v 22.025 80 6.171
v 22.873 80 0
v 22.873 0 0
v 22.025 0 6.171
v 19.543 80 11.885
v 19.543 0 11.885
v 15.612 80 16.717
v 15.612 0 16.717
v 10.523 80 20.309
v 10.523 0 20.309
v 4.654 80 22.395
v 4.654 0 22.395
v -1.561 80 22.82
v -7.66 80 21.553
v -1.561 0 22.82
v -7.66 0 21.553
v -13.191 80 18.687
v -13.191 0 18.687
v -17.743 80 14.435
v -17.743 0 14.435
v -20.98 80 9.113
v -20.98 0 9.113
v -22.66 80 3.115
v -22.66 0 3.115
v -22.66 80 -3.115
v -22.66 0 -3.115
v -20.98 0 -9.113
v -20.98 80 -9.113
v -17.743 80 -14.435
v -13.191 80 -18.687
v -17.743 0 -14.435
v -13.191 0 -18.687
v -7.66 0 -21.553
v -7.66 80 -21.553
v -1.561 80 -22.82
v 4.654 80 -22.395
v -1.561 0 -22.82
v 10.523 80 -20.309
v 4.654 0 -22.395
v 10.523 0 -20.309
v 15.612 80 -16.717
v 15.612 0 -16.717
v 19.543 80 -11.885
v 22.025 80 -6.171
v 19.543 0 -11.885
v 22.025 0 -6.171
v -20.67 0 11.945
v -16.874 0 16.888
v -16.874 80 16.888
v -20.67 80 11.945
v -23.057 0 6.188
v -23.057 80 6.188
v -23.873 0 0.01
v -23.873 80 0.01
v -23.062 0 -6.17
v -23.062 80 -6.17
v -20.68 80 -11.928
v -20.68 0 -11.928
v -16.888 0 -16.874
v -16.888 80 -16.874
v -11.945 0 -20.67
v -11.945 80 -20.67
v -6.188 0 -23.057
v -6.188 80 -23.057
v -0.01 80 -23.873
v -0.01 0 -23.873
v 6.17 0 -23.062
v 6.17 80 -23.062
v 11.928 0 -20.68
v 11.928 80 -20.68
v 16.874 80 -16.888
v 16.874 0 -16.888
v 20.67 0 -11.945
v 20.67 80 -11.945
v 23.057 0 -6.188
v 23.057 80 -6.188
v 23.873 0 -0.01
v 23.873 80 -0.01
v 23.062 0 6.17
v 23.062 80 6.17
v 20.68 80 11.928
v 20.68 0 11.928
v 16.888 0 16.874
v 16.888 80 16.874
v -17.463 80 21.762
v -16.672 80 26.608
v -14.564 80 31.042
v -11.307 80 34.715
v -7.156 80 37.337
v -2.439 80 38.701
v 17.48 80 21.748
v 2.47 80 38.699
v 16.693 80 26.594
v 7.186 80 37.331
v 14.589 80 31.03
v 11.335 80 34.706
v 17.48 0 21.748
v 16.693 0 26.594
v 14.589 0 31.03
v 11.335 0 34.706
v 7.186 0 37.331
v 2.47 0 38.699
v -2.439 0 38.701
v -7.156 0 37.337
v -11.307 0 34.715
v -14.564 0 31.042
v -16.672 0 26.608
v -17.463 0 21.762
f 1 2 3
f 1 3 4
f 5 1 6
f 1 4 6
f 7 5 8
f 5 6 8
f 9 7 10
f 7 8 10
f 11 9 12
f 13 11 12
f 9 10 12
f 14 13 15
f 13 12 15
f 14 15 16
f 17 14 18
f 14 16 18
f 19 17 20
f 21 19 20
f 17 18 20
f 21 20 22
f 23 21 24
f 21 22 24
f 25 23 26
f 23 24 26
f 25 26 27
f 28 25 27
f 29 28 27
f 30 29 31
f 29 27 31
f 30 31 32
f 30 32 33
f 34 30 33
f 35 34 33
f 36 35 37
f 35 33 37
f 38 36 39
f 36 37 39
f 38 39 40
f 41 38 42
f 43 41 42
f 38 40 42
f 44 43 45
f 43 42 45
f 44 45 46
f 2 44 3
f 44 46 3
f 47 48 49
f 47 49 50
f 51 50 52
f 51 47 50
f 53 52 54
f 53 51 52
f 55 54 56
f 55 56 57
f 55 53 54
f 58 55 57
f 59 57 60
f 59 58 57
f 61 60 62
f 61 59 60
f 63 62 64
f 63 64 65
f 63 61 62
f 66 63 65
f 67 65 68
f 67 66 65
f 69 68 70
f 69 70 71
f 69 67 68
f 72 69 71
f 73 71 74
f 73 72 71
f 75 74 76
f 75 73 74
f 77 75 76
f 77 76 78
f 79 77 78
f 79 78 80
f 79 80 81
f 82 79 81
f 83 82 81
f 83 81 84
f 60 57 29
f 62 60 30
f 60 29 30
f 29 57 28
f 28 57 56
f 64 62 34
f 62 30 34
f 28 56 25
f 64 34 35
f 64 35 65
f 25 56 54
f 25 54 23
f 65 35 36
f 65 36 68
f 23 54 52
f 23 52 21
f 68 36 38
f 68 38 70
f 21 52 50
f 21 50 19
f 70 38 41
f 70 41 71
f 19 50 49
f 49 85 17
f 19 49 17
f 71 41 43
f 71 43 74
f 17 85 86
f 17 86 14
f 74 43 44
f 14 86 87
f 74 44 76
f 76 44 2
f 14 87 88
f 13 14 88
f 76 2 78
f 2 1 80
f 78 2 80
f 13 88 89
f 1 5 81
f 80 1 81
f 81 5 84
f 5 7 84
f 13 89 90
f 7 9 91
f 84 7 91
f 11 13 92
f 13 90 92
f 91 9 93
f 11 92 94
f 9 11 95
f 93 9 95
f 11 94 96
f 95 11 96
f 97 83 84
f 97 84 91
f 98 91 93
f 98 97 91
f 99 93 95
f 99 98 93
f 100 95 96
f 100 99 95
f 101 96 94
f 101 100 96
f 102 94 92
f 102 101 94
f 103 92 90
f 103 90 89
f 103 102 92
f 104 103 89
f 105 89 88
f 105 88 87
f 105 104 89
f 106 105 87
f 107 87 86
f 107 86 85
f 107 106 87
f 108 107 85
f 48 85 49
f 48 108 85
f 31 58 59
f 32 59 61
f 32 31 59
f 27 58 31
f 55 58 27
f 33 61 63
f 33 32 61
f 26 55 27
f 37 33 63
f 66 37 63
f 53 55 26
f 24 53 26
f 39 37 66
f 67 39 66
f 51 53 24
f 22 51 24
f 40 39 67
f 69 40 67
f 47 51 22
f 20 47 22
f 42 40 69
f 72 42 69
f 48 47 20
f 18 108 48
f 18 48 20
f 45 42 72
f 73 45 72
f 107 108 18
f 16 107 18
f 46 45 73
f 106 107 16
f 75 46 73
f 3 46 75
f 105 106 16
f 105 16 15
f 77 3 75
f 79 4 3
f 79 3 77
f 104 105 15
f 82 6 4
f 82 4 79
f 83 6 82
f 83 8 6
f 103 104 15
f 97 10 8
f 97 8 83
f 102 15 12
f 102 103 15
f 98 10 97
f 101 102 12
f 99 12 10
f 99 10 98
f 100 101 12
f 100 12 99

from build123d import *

# Parameters (mm, degrees)
F0_R     = 23.8732414638
F1_DEPTH = 80
F2_R     = 22.8732414638
F3_DEPTH = 80
F5_DEPTH = 80


with BuildPart() as f1:
    # F0 (on Front) → F1 (new body)
    with BuildSketch(Plane.XZ):
        Circle(F0_R)
    extrude(amount=-F1_DEPTH)

    # F2 (on face) → F3 (cut)
    with BuildSketch(Plane.XZ):
        Circle(F2_R)
    extrude(amount=-F3_DEPTH, mode=Mode.SUBTRACT)

    # F4 (on face) → F5 (join)
    with BuildSketch(Plane.XZ):
        with BuildLine():
            ThreePointArc((-16.8741736493, 16.8876855028), (0.0095543232, 23.8732395519), (16.8876855028, 16.8741736493))
            ThreePointArc((16.8876855028, 16.8741736493), (0.0155574816, 38.8732383507), (-16.8741736493, 16.8876855028))
        make_face()
    extrude(amount=-F5_DEPTH)


solid = f1.part
